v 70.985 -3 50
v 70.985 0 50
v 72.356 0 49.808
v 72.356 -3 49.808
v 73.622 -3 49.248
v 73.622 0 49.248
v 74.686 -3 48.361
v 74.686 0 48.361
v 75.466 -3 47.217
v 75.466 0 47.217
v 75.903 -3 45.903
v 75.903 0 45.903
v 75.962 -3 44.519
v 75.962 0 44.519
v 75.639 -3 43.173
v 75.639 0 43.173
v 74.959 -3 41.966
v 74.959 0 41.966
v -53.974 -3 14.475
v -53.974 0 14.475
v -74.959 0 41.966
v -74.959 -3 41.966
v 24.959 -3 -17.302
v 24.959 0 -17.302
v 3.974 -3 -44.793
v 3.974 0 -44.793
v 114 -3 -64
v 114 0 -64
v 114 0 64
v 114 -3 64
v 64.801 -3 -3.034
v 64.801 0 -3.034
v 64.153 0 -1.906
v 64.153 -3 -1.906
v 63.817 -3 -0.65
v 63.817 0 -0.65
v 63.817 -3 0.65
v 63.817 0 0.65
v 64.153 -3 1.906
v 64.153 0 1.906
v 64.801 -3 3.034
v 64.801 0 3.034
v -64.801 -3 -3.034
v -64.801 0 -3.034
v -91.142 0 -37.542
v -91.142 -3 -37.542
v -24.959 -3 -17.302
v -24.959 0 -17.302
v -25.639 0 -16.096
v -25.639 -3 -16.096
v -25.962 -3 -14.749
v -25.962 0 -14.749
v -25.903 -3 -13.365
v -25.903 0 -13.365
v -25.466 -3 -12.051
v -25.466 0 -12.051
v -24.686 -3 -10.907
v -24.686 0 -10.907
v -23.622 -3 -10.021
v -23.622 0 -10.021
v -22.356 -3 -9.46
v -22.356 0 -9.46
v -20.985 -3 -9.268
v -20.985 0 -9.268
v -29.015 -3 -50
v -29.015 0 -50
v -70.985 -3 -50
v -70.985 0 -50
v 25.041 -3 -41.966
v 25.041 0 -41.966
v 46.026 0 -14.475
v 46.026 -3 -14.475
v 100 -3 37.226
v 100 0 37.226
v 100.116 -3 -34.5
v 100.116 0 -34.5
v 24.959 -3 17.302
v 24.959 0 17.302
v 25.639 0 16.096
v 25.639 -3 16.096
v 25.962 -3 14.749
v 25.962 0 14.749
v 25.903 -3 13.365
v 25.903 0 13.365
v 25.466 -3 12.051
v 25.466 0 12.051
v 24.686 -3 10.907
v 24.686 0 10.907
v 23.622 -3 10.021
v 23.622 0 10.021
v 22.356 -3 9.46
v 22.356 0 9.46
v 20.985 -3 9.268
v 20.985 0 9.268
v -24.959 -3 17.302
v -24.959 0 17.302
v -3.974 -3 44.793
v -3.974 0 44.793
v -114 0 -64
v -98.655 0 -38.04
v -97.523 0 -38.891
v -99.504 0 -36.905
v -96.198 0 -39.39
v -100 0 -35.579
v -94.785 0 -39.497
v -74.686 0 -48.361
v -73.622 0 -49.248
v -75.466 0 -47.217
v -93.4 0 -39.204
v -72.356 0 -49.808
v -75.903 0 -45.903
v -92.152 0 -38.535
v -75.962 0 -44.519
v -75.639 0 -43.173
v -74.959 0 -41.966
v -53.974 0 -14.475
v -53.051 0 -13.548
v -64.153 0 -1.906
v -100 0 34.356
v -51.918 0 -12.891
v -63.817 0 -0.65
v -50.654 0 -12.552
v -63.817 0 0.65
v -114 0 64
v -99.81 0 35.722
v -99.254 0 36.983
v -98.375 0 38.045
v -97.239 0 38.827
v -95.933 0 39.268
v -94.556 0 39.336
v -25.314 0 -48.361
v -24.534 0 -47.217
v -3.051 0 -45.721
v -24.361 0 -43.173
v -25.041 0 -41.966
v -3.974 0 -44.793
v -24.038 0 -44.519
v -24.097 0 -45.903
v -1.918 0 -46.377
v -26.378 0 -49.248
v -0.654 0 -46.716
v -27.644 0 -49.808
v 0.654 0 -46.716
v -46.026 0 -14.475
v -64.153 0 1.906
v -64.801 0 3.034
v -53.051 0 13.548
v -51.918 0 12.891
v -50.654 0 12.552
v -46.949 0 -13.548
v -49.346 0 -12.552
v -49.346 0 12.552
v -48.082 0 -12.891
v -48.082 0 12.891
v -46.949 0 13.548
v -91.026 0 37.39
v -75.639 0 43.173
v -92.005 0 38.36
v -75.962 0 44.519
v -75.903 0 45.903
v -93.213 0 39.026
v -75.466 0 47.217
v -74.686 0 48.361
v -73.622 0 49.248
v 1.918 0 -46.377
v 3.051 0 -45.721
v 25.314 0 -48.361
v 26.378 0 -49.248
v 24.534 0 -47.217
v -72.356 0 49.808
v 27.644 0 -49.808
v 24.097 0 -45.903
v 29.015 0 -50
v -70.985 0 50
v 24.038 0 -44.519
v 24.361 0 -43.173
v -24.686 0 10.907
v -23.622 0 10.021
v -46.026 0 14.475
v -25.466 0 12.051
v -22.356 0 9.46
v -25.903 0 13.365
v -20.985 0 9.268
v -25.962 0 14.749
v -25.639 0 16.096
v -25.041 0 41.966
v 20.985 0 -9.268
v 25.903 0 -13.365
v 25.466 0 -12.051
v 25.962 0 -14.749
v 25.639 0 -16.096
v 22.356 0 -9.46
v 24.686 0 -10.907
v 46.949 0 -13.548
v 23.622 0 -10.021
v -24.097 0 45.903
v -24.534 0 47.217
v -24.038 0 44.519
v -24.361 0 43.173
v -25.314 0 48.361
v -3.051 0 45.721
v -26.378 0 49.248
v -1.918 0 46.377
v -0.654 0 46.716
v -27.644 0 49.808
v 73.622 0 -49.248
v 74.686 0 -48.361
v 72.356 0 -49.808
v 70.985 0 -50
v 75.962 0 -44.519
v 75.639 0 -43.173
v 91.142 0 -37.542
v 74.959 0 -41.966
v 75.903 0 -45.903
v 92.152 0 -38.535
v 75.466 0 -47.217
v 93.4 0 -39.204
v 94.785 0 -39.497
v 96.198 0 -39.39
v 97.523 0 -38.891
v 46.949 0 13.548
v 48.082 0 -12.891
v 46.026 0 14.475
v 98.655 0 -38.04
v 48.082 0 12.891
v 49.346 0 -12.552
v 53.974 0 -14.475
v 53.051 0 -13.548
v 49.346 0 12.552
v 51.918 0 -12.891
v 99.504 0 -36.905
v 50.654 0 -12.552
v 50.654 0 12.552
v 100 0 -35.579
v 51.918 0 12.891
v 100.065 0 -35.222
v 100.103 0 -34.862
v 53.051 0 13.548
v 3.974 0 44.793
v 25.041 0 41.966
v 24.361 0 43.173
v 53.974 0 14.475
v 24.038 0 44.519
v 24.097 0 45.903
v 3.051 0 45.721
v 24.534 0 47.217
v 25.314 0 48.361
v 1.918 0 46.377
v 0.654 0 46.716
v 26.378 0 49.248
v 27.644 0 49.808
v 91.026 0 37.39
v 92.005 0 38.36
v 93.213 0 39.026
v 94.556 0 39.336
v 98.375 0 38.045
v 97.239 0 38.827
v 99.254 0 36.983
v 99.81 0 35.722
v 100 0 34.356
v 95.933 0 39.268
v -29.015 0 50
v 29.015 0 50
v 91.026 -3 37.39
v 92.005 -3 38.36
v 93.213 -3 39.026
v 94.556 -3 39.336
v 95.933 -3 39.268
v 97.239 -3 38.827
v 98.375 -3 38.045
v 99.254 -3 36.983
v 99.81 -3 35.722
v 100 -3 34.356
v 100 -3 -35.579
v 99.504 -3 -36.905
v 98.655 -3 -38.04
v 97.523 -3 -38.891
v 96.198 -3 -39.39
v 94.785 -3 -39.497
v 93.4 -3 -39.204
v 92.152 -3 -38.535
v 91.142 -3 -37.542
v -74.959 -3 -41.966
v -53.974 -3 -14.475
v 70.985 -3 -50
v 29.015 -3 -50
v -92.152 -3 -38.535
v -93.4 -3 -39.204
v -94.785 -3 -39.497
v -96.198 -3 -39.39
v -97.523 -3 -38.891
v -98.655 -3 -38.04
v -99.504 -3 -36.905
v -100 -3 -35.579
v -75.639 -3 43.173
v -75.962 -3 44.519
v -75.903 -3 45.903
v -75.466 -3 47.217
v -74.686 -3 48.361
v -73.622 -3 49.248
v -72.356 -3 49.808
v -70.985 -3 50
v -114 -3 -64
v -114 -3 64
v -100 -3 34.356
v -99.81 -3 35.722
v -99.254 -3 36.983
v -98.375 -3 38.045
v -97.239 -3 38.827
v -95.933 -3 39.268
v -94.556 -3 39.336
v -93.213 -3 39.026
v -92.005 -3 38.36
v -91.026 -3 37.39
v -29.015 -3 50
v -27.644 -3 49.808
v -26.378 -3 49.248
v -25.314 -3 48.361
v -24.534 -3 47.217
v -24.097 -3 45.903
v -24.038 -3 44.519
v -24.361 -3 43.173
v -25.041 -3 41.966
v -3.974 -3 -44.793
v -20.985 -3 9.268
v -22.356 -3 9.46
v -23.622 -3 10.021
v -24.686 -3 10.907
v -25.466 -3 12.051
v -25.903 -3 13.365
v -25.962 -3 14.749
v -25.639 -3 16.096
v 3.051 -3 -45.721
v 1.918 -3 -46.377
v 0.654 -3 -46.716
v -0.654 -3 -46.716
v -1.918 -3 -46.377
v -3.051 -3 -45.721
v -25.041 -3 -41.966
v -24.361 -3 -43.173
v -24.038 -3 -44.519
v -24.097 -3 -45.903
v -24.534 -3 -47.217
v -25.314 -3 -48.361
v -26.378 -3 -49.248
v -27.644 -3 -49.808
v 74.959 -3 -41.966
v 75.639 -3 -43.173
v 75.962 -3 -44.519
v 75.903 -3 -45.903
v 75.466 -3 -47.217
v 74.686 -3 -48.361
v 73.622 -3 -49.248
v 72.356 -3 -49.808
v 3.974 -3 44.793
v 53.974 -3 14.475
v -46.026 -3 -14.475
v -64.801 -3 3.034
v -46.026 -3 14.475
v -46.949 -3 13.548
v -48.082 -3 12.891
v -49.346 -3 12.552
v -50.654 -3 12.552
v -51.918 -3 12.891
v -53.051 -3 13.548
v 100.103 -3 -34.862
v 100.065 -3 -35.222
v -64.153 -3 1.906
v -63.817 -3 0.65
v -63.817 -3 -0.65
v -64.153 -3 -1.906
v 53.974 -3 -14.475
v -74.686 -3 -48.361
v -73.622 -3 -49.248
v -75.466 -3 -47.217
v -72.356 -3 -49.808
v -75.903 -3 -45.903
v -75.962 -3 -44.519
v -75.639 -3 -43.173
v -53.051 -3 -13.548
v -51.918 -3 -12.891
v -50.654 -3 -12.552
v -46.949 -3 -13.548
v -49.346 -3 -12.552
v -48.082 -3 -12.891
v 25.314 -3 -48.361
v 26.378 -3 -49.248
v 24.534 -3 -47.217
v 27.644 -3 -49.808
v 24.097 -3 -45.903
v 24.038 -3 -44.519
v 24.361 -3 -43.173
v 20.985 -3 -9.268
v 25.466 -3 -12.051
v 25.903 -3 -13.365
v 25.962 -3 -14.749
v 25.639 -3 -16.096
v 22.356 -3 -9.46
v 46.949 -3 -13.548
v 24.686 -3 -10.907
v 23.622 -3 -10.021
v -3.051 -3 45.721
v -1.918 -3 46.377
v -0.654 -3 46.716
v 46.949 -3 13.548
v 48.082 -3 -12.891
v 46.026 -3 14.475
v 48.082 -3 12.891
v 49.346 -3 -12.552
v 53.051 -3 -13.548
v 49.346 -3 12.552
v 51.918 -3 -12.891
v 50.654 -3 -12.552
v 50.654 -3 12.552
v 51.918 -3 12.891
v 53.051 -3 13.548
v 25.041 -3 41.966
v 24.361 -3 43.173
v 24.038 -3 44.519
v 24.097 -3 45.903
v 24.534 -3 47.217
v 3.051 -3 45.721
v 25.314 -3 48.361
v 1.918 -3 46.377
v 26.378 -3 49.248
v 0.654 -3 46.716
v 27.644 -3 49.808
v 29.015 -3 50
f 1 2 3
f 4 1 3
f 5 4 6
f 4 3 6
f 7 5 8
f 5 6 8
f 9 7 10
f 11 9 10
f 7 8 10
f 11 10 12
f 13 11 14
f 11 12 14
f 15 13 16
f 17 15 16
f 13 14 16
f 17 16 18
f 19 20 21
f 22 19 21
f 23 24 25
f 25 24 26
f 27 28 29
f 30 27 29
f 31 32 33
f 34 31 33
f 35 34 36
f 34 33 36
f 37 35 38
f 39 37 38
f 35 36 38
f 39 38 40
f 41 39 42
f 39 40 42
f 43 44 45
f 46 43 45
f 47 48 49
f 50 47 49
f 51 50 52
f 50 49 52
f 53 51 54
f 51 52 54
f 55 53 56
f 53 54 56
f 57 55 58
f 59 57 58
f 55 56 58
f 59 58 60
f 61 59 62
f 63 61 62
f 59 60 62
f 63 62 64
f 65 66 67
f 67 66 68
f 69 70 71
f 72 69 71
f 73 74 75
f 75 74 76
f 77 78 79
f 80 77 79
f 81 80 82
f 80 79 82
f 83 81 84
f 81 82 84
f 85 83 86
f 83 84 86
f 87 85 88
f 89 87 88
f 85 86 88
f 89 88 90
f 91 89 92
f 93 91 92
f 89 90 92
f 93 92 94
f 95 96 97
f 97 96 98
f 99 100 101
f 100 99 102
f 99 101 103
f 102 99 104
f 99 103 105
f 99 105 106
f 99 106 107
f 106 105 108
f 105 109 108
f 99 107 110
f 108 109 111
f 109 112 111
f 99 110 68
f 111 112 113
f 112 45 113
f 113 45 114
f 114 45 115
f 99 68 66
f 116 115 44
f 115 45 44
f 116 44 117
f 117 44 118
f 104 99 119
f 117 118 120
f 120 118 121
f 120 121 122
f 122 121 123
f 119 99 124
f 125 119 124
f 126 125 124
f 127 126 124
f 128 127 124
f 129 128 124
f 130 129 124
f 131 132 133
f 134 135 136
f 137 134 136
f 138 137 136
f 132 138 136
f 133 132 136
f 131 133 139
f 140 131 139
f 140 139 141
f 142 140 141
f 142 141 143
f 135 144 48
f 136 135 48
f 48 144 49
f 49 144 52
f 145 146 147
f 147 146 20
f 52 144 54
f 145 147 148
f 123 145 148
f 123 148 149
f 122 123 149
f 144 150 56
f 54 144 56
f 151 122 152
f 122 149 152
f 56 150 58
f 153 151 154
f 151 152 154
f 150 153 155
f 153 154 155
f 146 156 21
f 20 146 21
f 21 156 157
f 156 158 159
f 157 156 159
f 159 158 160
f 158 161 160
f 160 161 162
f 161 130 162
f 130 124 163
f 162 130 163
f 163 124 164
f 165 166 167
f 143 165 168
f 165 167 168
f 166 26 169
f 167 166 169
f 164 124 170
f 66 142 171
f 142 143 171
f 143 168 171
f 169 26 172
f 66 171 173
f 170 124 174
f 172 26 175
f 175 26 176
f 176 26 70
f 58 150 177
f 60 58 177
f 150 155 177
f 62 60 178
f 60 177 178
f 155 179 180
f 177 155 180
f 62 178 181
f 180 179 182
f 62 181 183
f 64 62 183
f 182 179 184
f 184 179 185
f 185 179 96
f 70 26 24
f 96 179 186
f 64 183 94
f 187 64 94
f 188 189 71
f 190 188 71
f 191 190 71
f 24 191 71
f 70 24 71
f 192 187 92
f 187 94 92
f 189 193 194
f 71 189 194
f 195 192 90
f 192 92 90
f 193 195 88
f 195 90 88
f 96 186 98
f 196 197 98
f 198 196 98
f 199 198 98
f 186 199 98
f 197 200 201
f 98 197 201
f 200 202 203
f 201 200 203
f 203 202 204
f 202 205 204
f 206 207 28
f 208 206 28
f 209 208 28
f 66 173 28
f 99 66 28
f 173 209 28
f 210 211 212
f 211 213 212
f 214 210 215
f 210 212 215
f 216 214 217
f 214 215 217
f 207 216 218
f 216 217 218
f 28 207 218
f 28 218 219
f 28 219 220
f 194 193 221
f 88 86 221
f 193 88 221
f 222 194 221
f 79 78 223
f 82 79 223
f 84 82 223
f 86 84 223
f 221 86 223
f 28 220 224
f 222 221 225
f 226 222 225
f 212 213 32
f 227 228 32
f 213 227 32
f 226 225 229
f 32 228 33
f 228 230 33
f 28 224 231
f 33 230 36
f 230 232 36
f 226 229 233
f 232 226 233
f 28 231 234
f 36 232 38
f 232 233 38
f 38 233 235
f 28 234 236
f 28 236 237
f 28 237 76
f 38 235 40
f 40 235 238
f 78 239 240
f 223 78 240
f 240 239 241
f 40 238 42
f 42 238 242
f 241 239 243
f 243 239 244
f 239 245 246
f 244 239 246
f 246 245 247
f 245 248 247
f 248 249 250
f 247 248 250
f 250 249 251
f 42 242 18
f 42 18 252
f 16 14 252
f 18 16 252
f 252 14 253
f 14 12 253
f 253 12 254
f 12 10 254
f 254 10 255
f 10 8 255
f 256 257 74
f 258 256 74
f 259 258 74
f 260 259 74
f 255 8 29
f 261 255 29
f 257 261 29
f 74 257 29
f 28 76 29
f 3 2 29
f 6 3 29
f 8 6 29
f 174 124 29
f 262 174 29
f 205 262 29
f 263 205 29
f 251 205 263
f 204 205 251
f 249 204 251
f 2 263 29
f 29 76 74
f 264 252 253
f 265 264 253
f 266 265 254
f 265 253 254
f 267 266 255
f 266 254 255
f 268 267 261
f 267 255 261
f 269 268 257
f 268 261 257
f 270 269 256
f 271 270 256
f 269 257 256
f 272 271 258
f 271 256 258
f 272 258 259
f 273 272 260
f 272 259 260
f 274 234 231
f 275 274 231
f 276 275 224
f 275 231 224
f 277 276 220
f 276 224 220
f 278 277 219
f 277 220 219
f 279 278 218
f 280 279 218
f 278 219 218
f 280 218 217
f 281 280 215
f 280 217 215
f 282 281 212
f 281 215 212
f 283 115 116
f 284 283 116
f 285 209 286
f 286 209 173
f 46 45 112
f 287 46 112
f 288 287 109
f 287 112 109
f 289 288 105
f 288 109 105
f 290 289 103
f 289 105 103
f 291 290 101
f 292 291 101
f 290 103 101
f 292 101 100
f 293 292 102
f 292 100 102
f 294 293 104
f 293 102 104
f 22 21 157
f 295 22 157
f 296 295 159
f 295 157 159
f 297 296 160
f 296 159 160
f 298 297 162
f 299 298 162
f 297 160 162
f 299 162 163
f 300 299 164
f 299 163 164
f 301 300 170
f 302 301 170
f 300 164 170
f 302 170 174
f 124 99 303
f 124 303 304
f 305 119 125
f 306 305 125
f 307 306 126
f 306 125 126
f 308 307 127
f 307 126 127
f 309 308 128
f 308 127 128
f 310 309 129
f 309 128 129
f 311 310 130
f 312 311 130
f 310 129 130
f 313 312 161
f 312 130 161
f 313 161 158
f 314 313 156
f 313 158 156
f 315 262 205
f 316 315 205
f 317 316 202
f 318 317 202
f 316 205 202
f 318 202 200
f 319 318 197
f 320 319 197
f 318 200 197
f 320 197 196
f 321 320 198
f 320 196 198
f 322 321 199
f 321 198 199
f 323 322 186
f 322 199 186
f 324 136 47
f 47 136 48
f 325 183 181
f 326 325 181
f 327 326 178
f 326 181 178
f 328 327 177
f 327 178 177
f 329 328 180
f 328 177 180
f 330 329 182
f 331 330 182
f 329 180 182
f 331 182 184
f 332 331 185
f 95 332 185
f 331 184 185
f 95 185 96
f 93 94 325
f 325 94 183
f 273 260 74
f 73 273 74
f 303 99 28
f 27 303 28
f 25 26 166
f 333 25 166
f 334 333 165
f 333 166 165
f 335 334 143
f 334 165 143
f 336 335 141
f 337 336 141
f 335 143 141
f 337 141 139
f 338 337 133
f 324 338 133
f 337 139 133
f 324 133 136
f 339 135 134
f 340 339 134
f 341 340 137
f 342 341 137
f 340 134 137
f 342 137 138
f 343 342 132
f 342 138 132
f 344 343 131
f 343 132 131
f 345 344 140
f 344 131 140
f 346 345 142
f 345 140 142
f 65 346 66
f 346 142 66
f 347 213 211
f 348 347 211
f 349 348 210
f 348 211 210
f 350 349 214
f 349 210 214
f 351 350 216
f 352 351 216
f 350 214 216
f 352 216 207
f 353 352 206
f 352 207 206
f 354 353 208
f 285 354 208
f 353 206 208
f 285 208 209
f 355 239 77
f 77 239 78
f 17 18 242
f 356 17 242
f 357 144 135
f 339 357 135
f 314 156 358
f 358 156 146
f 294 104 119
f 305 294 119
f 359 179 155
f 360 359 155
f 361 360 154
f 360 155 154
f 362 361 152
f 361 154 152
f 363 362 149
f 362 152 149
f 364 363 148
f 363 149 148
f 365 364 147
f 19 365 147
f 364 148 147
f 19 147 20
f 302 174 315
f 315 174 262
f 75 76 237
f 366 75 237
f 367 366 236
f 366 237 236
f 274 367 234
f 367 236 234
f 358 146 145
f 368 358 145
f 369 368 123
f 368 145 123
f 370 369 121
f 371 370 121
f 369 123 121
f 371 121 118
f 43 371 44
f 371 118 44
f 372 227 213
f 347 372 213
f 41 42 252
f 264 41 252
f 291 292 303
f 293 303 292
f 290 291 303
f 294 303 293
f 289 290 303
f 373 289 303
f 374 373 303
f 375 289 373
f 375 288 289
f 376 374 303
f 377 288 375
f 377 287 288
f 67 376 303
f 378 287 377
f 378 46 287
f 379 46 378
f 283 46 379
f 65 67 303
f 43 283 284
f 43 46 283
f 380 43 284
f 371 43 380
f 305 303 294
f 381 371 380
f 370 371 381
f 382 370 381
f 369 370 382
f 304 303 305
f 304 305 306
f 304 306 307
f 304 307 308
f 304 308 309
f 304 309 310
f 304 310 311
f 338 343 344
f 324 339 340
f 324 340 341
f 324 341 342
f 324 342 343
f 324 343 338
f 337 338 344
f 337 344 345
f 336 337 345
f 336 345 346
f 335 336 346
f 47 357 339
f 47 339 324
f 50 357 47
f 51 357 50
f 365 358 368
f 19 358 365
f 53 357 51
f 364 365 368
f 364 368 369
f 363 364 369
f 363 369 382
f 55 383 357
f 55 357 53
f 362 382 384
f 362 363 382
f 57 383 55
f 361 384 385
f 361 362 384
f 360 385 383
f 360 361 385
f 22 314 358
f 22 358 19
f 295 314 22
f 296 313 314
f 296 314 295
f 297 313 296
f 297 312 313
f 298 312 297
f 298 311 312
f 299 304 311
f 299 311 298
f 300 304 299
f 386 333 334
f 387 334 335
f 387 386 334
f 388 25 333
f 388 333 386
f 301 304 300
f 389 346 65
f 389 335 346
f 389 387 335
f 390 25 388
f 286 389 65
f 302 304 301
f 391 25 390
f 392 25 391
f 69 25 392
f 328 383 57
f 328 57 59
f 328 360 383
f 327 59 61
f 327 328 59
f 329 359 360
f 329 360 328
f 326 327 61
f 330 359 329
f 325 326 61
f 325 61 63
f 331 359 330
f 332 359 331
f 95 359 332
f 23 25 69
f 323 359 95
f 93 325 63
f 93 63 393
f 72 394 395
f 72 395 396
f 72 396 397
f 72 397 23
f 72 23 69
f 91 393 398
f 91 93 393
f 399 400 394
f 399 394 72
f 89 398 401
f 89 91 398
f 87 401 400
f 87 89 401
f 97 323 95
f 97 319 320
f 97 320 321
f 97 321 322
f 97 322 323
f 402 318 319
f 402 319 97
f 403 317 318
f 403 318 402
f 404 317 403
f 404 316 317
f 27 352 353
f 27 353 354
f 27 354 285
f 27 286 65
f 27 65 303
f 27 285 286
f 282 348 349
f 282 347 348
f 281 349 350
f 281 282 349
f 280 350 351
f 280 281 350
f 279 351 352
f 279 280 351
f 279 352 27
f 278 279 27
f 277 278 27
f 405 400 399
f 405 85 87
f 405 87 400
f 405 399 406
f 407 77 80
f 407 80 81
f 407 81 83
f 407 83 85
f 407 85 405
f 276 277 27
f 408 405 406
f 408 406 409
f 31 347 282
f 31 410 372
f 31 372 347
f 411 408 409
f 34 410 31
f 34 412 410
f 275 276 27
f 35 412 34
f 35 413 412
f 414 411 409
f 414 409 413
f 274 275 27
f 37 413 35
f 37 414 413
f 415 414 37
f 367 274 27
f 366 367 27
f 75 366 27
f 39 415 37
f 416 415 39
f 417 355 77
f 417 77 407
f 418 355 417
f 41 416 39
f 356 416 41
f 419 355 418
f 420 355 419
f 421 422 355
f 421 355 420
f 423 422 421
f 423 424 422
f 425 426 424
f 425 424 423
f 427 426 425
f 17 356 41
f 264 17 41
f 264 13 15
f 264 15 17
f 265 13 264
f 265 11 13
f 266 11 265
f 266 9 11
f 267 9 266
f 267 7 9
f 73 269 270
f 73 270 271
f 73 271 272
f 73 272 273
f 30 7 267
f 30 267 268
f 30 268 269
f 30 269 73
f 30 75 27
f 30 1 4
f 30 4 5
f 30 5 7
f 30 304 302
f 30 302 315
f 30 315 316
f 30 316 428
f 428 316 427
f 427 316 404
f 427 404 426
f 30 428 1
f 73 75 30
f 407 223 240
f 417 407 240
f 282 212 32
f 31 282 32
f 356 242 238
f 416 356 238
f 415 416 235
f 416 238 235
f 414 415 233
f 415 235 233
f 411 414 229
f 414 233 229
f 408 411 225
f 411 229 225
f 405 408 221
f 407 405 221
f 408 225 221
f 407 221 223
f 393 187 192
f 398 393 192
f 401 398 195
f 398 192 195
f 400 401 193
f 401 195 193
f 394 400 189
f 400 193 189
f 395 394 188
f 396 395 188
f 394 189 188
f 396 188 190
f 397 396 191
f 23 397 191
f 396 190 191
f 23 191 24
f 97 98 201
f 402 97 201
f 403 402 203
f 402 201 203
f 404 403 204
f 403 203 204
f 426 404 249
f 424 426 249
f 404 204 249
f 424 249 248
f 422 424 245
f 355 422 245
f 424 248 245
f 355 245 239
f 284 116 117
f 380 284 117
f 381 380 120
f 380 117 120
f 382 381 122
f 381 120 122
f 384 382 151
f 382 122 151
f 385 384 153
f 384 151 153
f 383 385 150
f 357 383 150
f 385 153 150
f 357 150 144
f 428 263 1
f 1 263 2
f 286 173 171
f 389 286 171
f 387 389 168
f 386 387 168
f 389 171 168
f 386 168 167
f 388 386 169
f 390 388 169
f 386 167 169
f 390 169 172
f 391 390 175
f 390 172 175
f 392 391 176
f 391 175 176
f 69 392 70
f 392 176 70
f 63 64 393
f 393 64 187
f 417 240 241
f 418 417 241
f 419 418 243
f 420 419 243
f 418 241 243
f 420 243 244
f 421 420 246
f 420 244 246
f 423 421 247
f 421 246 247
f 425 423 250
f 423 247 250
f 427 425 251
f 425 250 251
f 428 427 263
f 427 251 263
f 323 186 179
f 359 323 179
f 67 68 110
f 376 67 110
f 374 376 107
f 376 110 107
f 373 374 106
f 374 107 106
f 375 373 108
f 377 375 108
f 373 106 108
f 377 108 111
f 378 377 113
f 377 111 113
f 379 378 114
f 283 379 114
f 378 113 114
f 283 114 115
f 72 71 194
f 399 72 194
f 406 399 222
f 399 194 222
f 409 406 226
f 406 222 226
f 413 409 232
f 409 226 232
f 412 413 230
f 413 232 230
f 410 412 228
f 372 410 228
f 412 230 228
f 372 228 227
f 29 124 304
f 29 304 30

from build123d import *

# Parameters (mm, degrees)
F0_W     = 228.000006
F0_H     = 128.000006
F1_DEPTH = 3


with BuildPart() as f1:
    # F0 (on Front) → F1 (new body)
    with BuildSketch(Plane.XZ):
        Rectangle(F0_W, F0_H)
        with BuildLine():
            Line((100, -35.578923), (100, -50))
            Line((100, -50), (70.984792, -50))
            Line((70.984792, -50), (29.015208, -50))
            Line((29.015208, -50), (-29.015208, -50))
            Line((-29.015208, -50), (-70.984792, -50))
            Line((-70.984792, -50), (-100, -50))
            Line((-100, -50), (-100, -35.578923))
            Line((-100, -35.578923), (-100, 34.356112))
            Line((-100, 34.356112), (-100, 50))
            Line((-100, 50), (-70.984792, 50))
            Line((-70.984792, 50), (-29.015208, 50))
            Line((-29.015208, 50), (18.414966, 50))
            Line((18.414966, 50), (29.015208, 50))
            Line((29.015208, 50), (70.984792, 50))
            Line((70.984792, 50), (81.585034, 50))
            Line((81.585034, 50), (100, 50))
            Line((100, 50), (100, 37.225828))
            Line((100, 37.225828), (100.116007, -34.500008))
            ThreePointArc((100.116007, -34.500008), (100.087359, -35.042622), (100, -35.578923))
        make_face(mode=Mode.SUBTRACT)
        with BuildLine():
            Line((70.984792, -50), (100, -50))
            Line((100, -50), (100, -35.578923))
            ThreePointArc((100, -35.578923), (96.197739, -39.38968), (91.141582, -37.541887))
            Line((91.141582, -37.541887), (64.800607, -3.033792))
            ThreePointArc((64.800607, -3.033792), (63.775038, 0), (64.800607, 3.033792))
            Line((64.800607, 3.033792), (91.025569, 37.389904))
            ThreePointArc((91.025569, 37.389904), (96.601225, 39.092785), (100, 34.356112))
            Line((100, 34.356112), (100, 37.225828))
            Line((100, 37.225828), (100, 50))
            Line((100, 50), (81.585034, 50))
            Line((81.585034, 50), (70.984792, 50))
            ThreePointArc((70.984792, 50), (75.466363, 47.217097), (74.959223, 41.966208))
            Line((74.959223, 41.966208), (53.974431, 14.475001))
            ThreePointArc((53.974431, 14.475001), (50, 12.508793), (46.025569, 14.475001))
            Line((46.025569, 14.475001), (25.040777, 41.966208))
            ThreePointArc((25.040777, 41.966208), (24.533637, 47.217097), (29.015208, 50))
            Line((29.015208, 50), (18.414966, 50))
            Line((18.414966, 50), (-29.015208, 50))
            ThreePointArc((-29.015208, 50), (-24.533637, 47.217097), (-25.040777, 41.966208))
            Line((-25.040777, 41.966208), (-46.025569, 14.475001))
            ThreePointArc((-46.025569, 14.475001), (-50, 12.508793), (-53.974431, 14.475001))
            Line((-53.974431, 14.475001), (-74.959223, 41.966208))
            ThreePointArc((-74.959223, 41.966208), (-75.466363, 47.217097), (-70.984792, 50))
            Line((-70.984792, 50), (-100, 50))
            Line((-100, 50), (-100, 34.356112))
            ThreePointArc((-100, 34.356112), (-96.601225, 39.092785), (-91.025569, 37.389904))
            Line((-91.025569, 37.389904), (-64.800607, 3.033792))
            ThreePointArc((-64.800607, 3.033792), (-63.775038, 0), (-64.800607, -3.033792))
            Line((-64.800607, -3.033792), (-91.141582, -37.541887))
            ThreePointArc((-91.141582, -37.541887), (-96.197739, -39.38968), (-100, -35.578923))
            Line((-100, -35.578923), (-100, -50))
            Line((-100, -50), (-70.984792, -50))
            ThreePointArc((-70.984792, -50), (-75.466363, -47.217097), (-74.959223, -41.966208))
            Line((-74.959223, -41.966208), (-53.974431, -14.475001))
            ThreePointArc((-53.974431, -14.475001), (-50, -12.508793), (-46.025569, -14.475001))
            Line((-46.025569, -14.475001), (-25.040777, -41.966208))
            ThreePointArc((-25.040777, -41.966208), (-24.533637, -47.217097), (-29.015208, -50))
            Line((-29.015208, -50), (29.015208, -50))
            ThreePointArc((29.015208, -50), (24.533637, -47.217097), (25.040777, -41.966208))
            Line((25.040777, -41.966208), (46.025569, -14.475001))
            ThreePointArc((46.025569, -14.475001), (50, -12.508793), (53.974431, -14.475001))
            Line((53.974431, -14.475001), (74.959223, -41.966208))
            ThreePointArc((74.959223, -41.966208), (75.466363, -47.217097), (70.984792, -50))
        make_face()
        with BuildLine():
            Line((24.959223, -17.302074), (3.974431, -44.793281))
            ThreePointArc((3.974431, -44.793281), (0, -46.759489), (-3.974431, -44.793281))
            Line((-3.974431, -44.793281), (-24.959223, -17.302074))
            ThreePointArc((-24.959223, -17.302074), (-25.466363, -12.051185), (-20.984792, -9.268282))
            Line((-20.984792, -9.268282), (0, -9.268282))
            Line((0, -9.268282), (20.984792, -9.268282))
            ThreePointArc((20.984792, -9.268282), (25.466363, -12.051185), (24.959223, -17.302074))
        make_face(mode=Mode.SUBTRACT)
        with BuildLine():
            ThreePointArc((-3.974431, 44.793281), (0, 46.759489), (3.974431, 44.793281))
            Line((3.974431, 44.793281), (24.959223, 17.302074))
            ThreePointArc((24.959223, 17.302074), (25.466363, 12.051185), (20.984792, 9.268282))
            Line((20.984792, 9.268282), (0, 9.268282))
            Line((0, 9.268282), (-20.984792, 9.268282))
            ThreePointArc((-20.984792, 9.268282), (-25.466363, 12.051185), (-24.959223, 17.302074))
            Line((-24.959223, 17.302074), (-3.974431, 44.793281))
        make_face(mode=Mode.SUBTRACT)
    extrude(amount=F1_DEPTH)


solid = f1.part
